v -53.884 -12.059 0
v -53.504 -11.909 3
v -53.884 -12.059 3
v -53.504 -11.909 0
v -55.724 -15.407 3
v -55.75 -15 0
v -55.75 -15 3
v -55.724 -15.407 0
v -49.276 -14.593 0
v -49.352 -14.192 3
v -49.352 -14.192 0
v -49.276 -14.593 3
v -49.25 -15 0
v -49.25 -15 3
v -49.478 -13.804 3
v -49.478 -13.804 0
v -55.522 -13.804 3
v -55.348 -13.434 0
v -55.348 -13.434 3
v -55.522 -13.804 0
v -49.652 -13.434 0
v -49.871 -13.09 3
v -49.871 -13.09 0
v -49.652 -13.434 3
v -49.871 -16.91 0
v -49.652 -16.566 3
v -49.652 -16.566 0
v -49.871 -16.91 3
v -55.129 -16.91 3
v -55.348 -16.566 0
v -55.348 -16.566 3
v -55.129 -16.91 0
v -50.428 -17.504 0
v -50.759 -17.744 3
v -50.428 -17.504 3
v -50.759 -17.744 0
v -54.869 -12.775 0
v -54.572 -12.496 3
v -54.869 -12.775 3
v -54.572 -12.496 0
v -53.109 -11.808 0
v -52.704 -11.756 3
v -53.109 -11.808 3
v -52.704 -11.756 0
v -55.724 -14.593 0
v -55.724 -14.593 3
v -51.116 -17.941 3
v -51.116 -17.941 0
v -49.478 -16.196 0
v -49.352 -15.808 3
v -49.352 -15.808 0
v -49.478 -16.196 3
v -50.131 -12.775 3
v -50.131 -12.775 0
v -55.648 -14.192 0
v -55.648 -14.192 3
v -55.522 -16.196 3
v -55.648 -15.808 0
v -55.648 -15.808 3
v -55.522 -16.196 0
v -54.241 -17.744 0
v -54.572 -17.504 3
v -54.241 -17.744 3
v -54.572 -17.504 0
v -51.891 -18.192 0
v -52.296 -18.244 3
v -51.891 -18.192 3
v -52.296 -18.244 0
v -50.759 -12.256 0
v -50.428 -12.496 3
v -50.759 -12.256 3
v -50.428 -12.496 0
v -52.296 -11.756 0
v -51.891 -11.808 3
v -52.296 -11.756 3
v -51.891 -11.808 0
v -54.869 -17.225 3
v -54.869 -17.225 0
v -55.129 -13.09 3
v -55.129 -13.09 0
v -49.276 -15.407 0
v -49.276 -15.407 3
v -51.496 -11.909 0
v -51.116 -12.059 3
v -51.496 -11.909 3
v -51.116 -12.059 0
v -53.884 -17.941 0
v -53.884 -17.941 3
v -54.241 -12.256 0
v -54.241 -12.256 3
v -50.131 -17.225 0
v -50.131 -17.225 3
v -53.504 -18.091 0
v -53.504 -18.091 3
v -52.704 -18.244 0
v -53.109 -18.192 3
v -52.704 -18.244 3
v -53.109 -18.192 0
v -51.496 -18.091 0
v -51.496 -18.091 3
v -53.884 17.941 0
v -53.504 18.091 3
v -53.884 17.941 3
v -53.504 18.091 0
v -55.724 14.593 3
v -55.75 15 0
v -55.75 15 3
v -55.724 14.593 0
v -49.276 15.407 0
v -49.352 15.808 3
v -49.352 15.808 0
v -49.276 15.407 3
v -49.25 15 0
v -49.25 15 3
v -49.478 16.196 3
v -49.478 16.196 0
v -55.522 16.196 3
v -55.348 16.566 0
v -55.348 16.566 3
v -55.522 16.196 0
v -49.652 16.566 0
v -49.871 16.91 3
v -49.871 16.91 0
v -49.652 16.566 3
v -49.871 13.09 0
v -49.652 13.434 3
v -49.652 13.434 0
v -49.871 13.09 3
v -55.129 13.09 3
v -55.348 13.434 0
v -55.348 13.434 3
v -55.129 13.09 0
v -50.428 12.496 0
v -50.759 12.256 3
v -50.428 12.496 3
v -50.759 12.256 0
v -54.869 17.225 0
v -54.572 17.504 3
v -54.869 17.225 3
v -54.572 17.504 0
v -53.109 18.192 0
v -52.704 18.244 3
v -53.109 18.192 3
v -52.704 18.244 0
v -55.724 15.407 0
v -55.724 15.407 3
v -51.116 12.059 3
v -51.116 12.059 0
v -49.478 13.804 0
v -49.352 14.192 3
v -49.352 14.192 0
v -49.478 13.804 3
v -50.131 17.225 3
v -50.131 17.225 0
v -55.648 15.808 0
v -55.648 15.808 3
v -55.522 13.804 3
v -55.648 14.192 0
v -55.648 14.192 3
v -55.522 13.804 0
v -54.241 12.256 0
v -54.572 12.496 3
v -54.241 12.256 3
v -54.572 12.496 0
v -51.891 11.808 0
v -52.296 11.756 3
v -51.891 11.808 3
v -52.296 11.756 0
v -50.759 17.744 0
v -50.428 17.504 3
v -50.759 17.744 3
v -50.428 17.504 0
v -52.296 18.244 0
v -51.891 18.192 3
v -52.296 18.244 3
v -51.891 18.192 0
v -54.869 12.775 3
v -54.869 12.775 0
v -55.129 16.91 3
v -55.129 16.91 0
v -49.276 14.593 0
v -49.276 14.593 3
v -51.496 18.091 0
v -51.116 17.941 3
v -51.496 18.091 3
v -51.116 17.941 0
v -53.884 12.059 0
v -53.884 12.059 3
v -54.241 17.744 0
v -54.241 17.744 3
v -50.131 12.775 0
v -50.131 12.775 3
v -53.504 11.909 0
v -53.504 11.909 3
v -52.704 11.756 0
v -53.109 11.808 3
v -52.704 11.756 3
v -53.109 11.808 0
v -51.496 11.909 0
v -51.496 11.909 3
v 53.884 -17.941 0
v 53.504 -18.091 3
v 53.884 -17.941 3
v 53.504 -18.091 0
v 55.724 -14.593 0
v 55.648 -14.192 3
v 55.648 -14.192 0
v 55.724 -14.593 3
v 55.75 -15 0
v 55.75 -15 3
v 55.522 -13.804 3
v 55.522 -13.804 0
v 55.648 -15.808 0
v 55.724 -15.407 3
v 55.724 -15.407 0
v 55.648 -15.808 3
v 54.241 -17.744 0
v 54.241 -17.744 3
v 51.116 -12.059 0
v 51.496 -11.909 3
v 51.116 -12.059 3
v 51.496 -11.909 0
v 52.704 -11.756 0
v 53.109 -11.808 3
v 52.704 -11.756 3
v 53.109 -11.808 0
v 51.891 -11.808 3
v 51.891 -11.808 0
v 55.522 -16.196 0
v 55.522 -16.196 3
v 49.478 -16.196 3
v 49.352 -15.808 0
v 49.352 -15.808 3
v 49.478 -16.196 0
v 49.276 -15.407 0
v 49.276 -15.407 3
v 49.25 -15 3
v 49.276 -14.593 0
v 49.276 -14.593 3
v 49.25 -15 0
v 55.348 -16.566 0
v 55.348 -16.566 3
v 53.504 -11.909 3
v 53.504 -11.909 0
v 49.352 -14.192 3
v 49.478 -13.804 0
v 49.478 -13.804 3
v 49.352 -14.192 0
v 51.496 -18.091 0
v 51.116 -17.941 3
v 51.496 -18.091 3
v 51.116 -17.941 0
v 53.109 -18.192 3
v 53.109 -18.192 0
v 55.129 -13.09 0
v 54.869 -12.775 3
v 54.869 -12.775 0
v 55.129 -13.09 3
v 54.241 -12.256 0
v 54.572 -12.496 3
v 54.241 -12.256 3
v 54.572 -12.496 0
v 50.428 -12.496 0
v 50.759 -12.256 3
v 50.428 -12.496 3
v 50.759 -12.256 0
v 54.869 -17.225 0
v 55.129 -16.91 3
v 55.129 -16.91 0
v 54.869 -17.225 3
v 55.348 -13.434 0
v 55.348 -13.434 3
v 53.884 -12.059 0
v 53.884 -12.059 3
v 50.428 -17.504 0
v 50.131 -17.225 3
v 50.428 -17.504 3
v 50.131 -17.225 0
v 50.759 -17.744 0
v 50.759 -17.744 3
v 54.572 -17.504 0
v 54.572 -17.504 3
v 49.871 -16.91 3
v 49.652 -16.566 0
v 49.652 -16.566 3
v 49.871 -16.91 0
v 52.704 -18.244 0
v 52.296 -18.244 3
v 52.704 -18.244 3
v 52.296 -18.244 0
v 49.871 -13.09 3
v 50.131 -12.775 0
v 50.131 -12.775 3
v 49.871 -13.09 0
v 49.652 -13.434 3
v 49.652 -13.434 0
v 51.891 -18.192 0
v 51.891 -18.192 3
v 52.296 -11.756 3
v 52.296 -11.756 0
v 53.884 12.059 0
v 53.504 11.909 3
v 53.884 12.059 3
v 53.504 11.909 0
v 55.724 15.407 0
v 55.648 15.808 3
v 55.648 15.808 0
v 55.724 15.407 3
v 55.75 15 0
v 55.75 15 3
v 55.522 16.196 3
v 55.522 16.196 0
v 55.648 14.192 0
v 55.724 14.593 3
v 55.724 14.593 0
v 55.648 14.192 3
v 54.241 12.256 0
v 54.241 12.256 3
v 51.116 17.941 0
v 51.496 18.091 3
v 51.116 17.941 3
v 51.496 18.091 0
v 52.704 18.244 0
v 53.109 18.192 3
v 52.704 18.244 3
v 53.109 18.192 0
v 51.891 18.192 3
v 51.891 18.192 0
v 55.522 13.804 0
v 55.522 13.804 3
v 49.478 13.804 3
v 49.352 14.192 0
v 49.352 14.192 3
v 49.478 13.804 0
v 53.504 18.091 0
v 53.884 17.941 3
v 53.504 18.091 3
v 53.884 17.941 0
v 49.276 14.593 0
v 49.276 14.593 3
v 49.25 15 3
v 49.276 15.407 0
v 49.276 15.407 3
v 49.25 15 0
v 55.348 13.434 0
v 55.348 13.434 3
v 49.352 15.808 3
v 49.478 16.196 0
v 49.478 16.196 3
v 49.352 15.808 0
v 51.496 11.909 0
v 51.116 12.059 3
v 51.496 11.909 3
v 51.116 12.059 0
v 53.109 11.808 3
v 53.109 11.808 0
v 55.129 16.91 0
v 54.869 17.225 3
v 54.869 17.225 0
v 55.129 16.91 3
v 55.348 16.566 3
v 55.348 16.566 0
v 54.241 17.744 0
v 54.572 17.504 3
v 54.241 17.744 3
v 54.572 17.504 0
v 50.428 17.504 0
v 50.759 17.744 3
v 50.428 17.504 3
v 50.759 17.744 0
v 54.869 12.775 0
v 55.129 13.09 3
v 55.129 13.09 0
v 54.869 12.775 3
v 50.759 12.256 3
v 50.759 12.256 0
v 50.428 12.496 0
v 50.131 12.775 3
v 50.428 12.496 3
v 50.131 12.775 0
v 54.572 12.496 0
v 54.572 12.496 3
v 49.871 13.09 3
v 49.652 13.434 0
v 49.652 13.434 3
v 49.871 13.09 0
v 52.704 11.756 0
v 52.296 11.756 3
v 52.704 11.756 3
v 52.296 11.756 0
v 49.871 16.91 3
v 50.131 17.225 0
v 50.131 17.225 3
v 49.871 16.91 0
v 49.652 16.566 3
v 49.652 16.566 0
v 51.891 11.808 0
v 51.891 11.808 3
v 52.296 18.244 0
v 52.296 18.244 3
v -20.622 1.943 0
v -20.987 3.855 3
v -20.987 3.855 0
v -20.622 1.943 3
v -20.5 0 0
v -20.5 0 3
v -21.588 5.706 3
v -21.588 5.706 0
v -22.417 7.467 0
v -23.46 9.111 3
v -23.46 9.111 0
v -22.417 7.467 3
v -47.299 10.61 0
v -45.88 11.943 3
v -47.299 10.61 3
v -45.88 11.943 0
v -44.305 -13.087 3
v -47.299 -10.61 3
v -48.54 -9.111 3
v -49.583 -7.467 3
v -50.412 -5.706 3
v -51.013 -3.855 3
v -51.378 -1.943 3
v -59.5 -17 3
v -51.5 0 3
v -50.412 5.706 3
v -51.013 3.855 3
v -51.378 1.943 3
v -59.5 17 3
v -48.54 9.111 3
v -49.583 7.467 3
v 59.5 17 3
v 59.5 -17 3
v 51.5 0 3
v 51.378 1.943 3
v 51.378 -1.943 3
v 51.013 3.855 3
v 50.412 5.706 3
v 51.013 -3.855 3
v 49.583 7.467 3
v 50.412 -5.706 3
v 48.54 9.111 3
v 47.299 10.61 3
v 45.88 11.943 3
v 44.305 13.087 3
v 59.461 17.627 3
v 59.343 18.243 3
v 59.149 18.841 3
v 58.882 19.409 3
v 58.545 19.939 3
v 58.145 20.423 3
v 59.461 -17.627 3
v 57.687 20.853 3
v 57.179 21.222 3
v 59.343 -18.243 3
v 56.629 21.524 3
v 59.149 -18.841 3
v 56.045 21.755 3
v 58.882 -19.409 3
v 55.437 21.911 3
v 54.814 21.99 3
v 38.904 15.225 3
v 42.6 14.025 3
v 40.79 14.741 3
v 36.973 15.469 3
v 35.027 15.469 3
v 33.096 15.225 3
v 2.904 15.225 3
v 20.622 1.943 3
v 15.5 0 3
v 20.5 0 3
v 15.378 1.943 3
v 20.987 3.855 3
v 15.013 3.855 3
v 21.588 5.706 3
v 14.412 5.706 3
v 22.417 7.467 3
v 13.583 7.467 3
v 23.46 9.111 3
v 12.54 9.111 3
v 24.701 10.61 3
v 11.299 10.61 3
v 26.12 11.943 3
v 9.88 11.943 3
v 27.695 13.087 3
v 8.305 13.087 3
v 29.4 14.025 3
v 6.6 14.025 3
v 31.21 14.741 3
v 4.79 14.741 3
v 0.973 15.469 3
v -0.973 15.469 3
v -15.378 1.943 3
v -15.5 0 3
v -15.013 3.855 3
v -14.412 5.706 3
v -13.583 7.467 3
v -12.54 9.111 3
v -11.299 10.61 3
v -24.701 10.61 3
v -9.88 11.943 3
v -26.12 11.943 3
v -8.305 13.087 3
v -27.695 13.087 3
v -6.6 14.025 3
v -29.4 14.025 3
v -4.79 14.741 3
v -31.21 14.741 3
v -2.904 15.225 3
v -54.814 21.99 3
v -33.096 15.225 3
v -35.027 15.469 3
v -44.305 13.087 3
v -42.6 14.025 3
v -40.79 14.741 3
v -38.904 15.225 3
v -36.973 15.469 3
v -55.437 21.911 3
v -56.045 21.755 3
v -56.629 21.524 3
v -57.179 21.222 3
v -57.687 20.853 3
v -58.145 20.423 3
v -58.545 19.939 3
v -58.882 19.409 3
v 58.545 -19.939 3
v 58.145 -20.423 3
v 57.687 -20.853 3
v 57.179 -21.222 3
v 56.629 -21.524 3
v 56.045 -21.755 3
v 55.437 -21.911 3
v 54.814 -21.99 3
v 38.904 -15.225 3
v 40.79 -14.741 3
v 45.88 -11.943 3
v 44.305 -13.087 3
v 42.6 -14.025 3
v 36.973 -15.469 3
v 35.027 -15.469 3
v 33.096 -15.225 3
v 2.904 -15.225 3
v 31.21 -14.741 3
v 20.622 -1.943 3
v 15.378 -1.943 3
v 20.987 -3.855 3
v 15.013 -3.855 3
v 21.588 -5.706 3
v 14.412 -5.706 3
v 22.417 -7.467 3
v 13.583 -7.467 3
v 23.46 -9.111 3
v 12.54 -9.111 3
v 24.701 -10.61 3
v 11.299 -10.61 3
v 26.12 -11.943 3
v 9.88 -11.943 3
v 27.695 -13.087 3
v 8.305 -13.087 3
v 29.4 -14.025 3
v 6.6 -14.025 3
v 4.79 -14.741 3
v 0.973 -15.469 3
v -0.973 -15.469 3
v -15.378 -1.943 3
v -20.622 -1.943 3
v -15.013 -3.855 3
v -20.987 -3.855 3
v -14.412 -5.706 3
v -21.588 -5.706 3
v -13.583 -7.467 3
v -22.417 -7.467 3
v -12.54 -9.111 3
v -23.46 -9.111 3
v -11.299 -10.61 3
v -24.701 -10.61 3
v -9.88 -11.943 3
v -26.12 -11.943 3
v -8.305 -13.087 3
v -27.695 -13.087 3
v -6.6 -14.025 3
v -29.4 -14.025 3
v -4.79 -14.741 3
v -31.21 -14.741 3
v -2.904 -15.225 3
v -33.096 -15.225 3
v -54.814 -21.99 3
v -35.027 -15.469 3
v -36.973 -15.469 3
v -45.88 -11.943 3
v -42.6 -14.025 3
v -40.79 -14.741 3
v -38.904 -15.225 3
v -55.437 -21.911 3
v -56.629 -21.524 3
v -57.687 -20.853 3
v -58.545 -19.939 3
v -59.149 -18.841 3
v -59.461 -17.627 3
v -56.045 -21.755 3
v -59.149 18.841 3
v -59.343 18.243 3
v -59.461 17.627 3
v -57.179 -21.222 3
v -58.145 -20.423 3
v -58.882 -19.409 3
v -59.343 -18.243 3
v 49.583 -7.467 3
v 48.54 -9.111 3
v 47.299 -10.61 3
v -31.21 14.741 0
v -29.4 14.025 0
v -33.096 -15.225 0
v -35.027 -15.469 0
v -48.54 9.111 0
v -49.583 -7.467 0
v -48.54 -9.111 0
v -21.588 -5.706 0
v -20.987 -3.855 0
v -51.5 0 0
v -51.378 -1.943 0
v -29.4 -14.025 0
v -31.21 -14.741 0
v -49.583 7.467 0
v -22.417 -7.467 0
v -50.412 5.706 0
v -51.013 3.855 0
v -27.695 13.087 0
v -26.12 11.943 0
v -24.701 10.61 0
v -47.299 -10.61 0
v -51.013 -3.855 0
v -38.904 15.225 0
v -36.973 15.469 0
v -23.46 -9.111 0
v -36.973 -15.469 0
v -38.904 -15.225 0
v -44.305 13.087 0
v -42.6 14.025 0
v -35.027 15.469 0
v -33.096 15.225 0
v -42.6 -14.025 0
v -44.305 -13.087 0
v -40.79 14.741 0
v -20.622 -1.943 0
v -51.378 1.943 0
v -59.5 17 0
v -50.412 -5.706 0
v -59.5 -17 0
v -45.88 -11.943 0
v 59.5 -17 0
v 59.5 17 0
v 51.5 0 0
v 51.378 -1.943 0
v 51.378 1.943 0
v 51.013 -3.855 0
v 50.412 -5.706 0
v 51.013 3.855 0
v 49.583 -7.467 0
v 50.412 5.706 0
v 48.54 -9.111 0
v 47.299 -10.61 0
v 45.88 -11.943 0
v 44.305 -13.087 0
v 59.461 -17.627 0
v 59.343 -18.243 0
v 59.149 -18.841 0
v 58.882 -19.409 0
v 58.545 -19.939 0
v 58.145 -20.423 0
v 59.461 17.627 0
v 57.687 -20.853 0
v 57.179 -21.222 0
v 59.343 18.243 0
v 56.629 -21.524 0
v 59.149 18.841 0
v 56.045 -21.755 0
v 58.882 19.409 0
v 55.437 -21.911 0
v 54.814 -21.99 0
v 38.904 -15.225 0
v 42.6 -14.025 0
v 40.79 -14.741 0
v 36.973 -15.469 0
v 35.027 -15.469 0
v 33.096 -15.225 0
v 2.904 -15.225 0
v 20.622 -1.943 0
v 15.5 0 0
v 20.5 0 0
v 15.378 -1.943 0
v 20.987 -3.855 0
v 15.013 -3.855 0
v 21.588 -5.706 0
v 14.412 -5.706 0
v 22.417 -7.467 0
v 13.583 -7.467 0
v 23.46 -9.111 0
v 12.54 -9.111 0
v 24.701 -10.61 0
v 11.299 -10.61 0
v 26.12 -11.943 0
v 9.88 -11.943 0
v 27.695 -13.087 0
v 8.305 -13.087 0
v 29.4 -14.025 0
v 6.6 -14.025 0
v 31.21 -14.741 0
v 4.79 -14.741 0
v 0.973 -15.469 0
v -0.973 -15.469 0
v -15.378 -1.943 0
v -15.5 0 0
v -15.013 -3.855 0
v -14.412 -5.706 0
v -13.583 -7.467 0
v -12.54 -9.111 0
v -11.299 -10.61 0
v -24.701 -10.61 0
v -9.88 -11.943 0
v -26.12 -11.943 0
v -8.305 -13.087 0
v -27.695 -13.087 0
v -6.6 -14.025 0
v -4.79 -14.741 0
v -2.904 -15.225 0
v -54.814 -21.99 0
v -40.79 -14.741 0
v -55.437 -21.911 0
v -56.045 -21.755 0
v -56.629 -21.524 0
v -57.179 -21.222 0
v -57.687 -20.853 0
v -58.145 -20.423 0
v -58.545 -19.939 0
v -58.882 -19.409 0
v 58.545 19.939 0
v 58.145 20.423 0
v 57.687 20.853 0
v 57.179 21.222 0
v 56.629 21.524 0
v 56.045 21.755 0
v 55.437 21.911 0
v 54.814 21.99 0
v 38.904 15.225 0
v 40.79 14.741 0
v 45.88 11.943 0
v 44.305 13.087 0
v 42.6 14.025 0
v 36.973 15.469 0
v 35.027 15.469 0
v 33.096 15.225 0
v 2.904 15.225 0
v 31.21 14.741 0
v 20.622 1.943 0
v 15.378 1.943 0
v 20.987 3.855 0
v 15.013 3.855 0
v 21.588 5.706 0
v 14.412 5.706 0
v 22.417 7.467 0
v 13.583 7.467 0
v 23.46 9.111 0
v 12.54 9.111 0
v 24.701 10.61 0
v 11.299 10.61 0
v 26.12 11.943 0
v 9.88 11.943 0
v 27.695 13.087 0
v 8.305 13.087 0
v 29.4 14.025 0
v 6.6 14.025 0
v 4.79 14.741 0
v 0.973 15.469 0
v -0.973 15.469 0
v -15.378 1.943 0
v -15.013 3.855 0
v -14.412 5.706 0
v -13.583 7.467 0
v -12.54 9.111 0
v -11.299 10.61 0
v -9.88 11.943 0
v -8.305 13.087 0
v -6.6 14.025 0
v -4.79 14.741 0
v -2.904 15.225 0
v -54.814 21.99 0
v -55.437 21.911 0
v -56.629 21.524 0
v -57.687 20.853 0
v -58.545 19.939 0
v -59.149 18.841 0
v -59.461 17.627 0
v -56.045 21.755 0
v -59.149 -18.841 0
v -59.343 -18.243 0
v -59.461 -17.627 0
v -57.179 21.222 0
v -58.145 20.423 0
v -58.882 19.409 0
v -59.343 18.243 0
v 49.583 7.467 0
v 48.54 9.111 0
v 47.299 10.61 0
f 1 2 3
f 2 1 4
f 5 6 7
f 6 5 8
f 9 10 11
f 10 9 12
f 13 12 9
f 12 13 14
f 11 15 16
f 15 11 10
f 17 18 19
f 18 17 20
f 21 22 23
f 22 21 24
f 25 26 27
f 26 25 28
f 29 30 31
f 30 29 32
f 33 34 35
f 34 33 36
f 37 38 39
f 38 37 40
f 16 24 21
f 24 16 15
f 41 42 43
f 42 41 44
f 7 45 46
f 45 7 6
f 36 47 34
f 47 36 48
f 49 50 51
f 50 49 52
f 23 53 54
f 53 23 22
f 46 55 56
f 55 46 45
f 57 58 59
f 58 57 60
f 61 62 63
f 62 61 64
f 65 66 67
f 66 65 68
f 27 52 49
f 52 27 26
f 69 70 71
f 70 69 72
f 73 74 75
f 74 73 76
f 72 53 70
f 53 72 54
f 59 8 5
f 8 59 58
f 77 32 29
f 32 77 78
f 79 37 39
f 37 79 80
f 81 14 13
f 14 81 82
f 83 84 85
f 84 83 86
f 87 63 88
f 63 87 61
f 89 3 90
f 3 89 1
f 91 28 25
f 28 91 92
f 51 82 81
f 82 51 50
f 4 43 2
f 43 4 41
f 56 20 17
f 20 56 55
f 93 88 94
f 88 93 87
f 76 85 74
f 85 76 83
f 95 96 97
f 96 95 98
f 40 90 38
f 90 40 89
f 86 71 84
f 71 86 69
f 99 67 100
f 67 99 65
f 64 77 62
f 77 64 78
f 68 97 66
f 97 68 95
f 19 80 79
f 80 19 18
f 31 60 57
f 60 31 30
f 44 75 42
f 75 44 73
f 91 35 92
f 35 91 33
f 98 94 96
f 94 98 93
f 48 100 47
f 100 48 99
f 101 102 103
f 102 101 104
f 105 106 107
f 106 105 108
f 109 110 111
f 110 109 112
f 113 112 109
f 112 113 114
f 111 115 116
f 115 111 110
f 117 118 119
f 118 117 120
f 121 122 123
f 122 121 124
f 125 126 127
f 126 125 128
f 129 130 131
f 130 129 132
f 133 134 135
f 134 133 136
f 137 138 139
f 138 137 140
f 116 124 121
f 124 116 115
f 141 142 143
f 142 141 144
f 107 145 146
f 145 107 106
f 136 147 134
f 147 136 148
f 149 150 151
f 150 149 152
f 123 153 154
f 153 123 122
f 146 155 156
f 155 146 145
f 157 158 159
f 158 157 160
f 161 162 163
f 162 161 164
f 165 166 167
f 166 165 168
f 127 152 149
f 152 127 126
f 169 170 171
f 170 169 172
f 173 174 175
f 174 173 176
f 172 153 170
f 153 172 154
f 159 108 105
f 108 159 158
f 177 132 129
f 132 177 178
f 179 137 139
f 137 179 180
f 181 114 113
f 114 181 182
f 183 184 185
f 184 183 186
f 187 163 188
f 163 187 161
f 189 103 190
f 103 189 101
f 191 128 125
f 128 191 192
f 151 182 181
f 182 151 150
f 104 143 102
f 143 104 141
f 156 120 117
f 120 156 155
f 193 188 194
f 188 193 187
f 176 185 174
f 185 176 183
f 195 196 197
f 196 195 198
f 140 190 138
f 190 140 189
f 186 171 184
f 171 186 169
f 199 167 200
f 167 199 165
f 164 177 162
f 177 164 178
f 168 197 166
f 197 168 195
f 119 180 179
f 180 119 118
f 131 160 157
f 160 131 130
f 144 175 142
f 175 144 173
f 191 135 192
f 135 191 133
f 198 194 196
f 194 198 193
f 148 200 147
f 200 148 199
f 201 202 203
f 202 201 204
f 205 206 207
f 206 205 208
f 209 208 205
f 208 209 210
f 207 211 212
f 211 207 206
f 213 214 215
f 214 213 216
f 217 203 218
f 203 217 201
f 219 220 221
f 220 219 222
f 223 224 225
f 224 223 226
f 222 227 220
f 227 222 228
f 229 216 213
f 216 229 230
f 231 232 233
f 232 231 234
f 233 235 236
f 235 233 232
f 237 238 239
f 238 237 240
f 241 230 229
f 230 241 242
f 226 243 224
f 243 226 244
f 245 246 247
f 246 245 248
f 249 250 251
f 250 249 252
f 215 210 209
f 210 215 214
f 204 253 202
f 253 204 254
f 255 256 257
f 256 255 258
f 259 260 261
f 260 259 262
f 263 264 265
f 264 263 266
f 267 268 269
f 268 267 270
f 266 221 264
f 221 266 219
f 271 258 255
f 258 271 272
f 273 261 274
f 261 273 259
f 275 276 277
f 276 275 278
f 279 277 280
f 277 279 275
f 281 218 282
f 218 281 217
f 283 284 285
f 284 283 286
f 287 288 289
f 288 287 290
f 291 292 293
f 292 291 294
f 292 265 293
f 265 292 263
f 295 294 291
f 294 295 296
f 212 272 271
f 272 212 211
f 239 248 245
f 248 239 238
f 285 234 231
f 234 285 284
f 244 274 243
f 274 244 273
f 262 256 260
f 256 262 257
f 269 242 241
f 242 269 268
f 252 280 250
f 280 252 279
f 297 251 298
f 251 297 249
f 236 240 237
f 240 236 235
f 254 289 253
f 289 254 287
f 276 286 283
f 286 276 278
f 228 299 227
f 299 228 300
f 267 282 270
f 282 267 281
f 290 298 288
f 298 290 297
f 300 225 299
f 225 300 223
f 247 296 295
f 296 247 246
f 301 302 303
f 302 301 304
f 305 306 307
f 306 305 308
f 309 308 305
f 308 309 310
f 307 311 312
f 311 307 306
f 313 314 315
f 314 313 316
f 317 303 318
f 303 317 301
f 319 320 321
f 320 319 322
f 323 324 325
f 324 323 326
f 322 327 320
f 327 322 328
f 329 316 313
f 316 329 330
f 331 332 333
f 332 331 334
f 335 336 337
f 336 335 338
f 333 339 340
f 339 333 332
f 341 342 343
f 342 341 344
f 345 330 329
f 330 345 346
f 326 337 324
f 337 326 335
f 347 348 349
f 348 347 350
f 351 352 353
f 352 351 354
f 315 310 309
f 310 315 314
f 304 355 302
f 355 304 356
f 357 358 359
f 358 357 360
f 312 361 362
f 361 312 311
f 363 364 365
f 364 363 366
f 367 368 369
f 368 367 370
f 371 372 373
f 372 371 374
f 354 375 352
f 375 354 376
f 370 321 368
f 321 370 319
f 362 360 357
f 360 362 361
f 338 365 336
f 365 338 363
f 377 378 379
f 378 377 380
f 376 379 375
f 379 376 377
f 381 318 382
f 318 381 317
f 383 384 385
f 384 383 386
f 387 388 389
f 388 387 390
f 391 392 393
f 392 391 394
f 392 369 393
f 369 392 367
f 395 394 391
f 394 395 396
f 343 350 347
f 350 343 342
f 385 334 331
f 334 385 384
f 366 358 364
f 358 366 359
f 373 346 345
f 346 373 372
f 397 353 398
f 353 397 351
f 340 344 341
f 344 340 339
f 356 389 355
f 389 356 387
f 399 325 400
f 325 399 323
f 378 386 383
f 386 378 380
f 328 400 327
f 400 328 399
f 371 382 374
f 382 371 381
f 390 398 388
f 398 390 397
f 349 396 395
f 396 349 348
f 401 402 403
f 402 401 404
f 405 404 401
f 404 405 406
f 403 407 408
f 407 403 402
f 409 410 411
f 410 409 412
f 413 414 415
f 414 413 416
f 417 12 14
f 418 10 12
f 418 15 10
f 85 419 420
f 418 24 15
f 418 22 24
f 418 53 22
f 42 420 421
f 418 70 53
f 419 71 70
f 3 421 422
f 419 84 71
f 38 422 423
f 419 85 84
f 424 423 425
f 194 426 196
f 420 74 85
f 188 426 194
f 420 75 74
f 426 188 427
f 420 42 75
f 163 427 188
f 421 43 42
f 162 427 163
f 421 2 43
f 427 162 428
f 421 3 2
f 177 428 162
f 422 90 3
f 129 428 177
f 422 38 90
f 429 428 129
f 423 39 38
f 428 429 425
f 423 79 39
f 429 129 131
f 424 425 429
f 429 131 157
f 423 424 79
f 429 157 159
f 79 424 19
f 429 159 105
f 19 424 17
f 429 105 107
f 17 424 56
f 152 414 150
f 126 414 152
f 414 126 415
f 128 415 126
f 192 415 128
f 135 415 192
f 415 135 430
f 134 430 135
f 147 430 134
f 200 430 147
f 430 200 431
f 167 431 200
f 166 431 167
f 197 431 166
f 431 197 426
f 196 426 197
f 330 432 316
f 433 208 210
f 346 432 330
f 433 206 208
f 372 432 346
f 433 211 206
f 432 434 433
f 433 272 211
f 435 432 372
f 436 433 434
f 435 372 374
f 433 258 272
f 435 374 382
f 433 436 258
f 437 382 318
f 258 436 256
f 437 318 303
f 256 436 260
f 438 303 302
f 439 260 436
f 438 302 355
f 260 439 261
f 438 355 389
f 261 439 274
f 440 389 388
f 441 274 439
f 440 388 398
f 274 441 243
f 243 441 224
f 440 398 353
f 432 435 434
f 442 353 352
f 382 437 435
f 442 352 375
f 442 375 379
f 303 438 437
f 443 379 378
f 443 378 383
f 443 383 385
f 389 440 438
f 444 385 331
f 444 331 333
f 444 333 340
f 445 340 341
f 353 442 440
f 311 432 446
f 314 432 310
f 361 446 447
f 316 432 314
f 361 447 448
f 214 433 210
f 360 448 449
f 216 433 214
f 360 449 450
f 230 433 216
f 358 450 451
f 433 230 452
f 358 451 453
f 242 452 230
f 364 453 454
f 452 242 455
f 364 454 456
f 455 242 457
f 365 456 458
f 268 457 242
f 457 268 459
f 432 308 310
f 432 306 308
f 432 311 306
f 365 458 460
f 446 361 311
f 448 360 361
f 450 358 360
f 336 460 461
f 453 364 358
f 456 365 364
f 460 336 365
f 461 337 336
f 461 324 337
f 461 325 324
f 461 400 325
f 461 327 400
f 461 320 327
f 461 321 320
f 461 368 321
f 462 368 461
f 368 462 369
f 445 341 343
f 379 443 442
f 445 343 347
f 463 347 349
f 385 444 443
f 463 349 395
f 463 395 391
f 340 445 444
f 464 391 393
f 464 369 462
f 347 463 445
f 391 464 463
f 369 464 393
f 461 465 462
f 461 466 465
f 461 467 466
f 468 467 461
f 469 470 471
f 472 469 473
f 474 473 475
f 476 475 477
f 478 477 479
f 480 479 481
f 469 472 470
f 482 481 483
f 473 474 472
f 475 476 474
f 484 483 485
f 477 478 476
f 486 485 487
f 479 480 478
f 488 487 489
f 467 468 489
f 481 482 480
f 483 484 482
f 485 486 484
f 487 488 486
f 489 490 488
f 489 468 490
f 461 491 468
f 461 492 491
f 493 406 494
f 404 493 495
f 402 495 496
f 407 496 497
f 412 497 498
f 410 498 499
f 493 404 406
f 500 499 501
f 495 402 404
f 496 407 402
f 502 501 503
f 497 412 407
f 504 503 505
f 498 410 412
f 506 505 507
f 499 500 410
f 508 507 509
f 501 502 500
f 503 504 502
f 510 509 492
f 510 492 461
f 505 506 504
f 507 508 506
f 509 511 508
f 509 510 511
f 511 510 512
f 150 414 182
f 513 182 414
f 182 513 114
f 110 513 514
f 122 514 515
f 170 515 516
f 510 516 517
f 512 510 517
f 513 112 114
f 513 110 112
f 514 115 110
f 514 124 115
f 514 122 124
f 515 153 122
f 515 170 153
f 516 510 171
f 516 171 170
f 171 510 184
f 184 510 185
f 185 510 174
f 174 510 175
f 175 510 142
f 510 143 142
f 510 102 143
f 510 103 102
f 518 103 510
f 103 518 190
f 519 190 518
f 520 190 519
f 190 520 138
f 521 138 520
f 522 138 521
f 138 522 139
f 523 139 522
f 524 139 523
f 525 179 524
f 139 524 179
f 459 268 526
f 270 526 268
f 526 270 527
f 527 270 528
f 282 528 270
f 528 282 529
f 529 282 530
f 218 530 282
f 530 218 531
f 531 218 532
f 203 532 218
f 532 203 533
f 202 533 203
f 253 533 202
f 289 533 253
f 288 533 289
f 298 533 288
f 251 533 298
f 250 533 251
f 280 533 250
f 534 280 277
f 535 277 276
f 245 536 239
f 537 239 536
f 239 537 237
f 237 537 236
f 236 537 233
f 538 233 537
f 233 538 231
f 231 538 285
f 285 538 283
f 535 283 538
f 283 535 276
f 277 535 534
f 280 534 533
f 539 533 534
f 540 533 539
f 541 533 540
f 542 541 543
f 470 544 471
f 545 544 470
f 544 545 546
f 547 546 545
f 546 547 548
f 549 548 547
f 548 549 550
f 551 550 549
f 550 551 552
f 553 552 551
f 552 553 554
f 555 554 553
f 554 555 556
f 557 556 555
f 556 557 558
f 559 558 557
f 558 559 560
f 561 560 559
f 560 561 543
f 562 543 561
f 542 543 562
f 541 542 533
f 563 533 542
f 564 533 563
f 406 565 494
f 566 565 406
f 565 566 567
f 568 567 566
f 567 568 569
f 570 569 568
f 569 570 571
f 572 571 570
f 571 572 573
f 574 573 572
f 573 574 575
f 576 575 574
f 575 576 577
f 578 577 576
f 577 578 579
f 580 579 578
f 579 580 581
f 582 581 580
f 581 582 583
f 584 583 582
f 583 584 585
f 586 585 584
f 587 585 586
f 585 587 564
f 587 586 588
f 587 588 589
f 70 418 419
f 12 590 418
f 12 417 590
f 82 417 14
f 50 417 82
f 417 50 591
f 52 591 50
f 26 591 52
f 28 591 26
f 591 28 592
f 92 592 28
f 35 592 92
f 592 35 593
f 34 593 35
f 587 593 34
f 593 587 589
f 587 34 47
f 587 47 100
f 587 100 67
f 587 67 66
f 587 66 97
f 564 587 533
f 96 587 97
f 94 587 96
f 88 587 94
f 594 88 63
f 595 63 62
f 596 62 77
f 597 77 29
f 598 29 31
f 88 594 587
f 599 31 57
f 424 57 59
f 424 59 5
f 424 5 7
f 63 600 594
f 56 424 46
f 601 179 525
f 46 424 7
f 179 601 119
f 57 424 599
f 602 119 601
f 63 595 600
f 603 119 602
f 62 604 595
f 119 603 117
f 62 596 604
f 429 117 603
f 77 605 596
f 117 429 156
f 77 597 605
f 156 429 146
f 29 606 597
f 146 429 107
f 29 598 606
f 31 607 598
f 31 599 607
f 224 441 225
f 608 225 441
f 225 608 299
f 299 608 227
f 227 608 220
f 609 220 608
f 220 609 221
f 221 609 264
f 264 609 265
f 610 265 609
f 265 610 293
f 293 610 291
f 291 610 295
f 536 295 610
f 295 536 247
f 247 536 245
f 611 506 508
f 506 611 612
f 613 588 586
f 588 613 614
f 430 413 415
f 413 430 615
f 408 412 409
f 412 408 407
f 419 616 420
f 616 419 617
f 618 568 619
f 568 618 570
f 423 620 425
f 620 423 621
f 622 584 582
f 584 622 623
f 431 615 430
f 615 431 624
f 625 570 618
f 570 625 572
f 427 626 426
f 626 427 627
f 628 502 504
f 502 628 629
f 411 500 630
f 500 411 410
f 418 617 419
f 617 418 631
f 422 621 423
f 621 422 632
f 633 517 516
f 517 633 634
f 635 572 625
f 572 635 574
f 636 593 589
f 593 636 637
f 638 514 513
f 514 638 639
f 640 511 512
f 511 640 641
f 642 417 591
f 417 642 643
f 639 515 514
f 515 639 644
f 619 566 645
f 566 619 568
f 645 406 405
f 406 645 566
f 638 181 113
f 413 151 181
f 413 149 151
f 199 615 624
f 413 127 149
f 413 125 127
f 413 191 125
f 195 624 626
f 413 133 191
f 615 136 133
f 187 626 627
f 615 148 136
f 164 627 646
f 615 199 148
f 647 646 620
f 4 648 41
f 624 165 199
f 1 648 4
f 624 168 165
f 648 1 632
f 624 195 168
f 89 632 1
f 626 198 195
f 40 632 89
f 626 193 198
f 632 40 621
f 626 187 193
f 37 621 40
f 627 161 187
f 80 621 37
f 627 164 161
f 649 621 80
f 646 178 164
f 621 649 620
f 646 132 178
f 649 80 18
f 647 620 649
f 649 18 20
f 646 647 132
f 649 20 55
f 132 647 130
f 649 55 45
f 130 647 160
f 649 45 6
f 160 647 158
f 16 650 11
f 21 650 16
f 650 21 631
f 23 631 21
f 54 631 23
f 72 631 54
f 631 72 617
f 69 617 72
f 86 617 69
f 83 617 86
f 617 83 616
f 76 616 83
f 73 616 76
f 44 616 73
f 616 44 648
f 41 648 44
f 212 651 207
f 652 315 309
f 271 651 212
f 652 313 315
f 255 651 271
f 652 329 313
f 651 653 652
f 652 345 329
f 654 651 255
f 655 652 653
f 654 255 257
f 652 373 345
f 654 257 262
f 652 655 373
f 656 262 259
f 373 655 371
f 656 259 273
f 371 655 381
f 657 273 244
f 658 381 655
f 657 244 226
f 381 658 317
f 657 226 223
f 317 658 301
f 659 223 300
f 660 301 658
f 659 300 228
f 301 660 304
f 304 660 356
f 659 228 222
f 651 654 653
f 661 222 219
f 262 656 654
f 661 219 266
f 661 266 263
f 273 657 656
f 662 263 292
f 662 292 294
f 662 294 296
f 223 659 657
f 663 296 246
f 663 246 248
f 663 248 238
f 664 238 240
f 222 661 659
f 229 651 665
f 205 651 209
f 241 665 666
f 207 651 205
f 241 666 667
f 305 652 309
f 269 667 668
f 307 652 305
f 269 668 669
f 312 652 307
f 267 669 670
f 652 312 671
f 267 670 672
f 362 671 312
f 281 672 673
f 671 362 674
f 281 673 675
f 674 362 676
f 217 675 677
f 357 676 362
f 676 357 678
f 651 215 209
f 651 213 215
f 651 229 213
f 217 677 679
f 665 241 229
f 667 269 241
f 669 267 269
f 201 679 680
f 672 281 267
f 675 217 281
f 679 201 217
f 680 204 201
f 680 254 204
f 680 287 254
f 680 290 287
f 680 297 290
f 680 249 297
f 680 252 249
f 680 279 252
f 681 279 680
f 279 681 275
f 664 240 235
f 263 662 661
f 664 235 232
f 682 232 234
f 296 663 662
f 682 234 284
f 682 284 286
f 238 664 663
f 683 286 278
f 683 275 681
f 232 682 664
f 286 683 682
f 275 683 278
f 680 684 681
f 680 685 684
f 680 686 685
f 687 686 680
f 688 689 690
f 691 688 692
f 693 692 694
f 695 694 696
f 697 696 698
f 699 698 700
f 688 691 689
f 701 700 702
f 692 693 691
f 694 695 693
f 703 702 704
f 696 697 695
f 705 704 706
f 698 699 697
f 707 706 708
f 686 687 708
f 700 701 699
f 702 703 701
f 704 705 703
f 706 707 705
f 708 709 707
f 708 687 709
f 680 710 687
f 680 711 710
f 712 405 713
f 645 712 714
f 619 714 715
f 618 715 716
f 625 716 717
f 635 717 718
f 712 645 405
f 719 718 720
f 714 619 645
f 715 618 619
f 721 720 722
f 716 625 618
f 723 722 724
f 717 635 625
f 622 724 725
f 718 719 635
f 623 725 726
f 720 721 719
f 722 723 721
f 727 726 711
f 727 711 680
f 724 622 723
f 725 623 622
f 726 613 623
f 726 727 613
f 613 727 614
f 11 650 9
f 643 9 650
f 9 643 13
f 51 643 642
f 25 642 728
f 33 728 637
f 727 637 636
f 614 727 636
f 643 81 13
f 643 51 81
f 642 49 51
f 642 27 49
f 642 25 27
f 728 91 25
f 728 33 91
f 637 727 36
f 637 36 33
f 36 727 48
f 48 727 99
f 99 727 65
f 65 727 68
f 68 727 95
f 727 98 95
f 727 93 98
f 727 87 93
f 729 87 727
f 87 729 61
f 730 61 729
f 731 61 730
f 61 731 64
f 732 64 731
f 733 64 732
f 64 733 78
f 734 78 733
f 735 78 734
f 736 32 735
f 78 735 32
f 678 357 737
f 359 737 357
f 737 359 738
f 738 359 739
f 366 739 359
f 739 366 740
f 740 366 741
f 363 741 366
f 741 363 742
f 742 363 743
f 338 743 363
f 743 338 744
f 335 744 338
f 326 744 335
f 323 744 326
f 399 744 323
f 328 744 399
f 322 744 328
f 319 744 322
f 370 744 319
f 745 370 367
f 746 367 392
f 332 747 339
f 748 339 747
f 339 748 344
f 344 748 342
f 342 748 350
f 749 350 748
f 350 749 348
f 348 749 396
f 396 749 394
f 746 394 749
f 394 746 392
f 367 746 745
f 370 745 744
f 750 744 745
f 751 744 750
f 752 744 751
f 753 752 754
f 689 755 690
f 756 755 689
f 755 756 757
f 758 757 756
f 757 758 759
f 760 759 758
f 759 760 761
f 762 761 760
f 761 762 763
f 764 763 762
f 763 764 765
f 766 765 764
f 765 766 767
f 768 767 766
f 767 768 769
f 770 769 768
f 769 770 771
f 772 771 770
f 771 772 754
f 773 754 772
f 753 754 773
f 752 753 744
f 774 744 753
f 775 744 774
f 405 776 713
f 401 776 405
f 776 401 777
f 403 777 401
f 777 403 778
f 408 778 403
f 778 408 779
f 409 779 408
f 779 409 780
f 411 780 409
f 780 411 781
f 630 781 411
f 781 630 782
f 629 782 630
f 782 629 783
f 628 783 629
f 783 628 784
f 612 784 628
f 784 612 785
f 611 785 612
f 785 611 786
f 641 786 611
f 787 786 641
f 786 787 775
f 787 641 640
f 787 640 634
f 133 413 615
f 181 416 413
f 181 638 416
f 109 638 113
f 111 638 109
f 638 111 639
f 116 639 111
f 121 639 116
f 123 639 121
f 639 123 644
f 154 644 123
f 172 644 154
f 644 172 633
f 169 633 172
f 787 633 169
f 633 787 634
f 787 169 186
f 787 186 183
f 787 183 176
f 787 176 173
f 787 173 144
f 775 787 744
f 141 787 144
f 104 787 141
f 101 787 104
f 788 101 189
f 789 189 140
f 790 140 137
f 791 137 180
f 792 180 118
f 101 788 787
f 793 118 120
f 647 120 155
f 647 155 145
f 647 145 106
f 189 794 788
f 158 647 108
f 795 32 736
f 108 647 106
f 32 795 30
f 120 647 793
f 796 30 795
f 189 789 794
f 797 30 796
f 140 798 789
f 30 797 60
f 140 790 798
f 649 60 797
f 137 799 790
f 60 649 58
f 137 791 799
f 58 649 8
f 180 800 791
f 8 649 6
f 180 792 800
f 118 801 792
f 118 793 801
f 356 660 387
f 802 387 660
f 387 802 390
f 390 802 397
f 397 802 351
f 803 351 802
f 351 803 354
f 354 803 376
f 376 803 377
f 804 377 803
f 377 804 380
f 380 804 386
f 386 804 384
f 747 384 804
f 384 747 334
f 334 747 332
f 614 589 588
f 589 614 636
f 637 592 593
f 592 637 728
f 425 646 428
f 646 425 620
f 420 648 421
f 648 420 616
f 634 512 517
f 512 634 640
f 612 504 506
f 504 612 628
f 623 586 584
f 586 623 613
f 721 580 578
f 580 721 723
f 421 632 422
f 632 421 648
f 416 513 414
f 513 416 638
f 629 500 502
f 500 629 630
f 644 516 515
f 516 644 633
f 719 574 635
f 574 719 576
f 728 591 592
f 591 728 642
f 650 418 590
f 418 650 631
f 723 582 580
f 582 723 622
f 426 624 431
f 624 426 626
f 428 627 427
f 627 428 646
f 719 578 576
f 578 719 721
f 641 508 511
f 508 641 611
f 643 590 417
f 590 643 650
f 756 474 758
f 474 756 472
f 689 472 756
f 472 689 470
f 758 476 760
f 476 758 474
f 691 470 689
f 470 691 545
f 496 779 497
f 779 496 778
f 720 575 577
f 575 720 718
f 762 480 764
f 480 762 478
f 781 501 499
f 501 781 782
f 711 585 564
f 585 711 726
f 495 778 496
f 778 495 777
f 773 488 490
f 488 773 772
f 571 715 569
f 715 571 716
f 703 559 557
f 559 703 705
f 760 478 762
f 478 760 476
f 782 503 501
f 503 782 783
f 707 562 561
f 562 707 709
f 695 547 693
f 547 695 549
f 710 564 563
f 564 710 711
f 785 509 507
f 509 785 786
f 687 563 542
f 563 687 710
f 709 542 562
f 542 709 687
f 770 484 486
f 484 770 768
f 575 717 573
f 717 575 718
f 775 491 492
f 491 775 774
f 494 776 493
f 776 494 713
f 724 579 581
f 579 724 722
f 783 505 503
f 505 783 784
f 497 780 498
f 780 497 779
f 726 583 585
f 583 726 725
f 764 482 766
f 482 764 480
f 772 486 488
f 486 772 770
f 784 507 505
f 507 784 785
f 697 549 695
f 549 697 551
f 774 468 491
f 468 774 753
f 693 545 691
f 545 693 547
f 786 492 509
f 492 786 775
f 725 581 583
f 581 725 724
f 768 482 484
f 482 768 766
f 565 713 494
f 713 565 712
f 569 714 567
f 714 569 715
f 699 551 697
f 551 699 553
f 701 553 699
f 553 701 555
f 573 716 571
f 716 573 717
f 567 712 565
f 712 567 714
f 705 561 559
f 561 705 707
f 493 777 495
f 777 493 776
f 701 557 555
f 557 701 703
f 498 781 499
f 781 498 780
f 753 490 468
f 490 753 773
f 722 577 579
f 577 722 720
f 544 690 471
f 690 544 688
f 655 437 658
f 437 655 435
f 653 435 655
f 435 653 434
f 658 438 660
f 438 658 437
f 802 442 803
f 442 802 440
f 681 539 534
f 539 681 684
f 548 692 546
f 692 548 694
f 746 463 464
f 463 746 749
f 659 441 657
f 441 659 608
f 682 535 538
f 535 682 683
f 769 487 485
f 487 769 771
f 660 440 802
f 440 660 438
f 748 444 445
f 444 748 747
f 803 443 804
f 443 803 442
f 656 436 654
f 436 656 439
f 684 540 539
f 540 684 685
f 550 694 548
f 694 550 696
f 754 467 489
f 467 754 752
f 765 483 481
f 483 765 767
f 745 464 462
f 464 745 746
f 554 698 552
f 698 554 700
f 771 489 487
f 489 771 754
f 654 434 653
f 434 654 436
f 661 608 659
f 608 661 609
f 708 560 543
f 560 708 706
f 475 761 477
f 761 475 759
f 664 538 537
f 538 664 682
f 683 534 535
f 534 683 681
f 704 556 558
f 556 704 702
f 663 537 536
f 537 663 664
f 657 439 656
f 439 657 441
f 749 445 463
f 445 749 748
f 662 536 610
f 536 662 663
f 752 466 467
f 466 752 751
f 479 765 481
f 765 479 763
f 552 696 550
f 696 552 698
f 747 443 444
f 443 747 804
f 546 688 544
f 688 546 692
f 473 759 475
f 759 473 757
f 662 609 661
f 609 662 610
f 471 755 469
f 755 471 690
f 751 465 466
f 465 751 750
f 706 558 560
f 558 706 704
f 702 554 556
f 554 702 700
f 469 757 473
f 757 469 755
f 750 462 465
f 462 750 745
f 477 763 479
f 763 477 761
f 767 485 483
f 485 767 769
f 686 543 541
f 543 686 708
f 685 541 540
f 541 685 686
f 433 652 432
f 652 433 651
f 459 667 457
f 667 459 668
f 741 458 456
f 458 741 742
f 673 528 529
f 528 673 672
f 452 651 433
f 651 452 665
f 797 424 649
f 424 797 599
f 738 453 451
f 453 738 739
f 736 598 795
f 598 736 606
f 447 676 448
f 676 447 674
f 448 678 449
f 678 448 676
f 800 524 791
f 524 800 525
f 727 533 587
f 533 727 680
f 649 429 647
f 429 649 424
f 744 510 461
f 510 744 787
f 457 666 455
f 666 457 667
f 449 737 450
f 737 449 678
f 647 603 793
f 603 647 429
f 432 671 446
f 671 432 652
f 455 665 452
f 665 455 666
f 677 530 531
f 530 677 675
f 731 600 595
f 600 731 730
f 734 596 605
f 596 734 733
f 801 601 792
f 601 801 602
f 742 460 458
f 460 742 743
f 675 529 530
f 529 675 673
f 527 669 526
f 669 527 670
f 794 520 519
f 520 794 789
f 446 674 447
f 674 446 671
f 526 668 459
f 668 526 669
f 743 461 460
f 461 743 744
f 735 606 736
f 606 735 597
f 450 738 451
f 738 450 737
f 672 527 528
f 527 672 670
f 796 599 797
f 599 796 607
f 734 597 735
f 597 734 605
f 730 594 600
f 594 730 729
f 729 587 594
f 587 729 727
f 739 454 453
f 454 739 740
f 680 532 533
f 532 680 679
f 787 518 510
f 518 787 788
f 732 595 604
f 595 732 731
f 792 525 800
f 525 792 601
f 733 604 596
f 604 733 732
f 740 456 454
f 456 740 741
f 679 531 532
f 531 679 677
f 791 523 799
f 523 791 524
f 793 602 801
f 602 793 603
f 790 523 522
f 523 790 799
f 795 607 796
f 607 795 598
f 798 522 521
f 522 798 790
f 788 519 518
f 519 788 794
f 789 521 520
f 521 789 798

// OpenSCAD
$fn = 50;

difference() {
	union() {
		hull() {
			translate(v = [-54.5, 17.0, 0]) {
				cylinder(h = 3, r = 5);
			}
			translate(v = [54.5, 17.0, 0]) {
				cylinder(h = 3, r = 5);
			}
			translate(v = [-54.5, -17.0, 0]) {
				cylinder(h = 3, r = 5);
			}
			translate(v = [54.5, -17.0, 0]) {
				cylinder(h = 3, r = 5);
			}
		}
	}
	union() {
		translate(v = [-52.5, -15.0, -100.0]) {
			cylinder(h = 200, r = 3.25);
		}
		translate(v = [-52.5, 15.0, -100.0]) {
			cylinder(h = 200, r = 3.25);
		}
		translate(v = [52.5, -15.0, -100.0]) {
			cylinder(h = 200, r = 3.25);
		}
		translate(v = [52.5, 15.0, -100.0]) {
			cylinder(h = 200, r = 3.25);
		}
		translate(v = [-52.5, -15.0, -100.0]) {
			cylinder(h = 200, r = 1.8);
		}
		translate(v = [-52.5, 15.0, -100.0]) {
			cylinder(h = 200, r = 1.8);
		}
		translate(v = [52.5, -15.0, -100.0]) {
			cylinder(h = 200, r = 1.8);
		}
		translate(v = [52.5, 15.0, -100.0]) {
			cylinder(h = 200, r = 1.8);
		}
		translate(v = [-36.0, 0, 0.0]) {
			cylinder(h = 3, r = 15.5);
		}
		cylinder(h = 3, r = 15.5);
		translate(v = [36.0, 0, 0.0]) {
			cylinder(h = 3, r = 15.5);
		}
	}
}
